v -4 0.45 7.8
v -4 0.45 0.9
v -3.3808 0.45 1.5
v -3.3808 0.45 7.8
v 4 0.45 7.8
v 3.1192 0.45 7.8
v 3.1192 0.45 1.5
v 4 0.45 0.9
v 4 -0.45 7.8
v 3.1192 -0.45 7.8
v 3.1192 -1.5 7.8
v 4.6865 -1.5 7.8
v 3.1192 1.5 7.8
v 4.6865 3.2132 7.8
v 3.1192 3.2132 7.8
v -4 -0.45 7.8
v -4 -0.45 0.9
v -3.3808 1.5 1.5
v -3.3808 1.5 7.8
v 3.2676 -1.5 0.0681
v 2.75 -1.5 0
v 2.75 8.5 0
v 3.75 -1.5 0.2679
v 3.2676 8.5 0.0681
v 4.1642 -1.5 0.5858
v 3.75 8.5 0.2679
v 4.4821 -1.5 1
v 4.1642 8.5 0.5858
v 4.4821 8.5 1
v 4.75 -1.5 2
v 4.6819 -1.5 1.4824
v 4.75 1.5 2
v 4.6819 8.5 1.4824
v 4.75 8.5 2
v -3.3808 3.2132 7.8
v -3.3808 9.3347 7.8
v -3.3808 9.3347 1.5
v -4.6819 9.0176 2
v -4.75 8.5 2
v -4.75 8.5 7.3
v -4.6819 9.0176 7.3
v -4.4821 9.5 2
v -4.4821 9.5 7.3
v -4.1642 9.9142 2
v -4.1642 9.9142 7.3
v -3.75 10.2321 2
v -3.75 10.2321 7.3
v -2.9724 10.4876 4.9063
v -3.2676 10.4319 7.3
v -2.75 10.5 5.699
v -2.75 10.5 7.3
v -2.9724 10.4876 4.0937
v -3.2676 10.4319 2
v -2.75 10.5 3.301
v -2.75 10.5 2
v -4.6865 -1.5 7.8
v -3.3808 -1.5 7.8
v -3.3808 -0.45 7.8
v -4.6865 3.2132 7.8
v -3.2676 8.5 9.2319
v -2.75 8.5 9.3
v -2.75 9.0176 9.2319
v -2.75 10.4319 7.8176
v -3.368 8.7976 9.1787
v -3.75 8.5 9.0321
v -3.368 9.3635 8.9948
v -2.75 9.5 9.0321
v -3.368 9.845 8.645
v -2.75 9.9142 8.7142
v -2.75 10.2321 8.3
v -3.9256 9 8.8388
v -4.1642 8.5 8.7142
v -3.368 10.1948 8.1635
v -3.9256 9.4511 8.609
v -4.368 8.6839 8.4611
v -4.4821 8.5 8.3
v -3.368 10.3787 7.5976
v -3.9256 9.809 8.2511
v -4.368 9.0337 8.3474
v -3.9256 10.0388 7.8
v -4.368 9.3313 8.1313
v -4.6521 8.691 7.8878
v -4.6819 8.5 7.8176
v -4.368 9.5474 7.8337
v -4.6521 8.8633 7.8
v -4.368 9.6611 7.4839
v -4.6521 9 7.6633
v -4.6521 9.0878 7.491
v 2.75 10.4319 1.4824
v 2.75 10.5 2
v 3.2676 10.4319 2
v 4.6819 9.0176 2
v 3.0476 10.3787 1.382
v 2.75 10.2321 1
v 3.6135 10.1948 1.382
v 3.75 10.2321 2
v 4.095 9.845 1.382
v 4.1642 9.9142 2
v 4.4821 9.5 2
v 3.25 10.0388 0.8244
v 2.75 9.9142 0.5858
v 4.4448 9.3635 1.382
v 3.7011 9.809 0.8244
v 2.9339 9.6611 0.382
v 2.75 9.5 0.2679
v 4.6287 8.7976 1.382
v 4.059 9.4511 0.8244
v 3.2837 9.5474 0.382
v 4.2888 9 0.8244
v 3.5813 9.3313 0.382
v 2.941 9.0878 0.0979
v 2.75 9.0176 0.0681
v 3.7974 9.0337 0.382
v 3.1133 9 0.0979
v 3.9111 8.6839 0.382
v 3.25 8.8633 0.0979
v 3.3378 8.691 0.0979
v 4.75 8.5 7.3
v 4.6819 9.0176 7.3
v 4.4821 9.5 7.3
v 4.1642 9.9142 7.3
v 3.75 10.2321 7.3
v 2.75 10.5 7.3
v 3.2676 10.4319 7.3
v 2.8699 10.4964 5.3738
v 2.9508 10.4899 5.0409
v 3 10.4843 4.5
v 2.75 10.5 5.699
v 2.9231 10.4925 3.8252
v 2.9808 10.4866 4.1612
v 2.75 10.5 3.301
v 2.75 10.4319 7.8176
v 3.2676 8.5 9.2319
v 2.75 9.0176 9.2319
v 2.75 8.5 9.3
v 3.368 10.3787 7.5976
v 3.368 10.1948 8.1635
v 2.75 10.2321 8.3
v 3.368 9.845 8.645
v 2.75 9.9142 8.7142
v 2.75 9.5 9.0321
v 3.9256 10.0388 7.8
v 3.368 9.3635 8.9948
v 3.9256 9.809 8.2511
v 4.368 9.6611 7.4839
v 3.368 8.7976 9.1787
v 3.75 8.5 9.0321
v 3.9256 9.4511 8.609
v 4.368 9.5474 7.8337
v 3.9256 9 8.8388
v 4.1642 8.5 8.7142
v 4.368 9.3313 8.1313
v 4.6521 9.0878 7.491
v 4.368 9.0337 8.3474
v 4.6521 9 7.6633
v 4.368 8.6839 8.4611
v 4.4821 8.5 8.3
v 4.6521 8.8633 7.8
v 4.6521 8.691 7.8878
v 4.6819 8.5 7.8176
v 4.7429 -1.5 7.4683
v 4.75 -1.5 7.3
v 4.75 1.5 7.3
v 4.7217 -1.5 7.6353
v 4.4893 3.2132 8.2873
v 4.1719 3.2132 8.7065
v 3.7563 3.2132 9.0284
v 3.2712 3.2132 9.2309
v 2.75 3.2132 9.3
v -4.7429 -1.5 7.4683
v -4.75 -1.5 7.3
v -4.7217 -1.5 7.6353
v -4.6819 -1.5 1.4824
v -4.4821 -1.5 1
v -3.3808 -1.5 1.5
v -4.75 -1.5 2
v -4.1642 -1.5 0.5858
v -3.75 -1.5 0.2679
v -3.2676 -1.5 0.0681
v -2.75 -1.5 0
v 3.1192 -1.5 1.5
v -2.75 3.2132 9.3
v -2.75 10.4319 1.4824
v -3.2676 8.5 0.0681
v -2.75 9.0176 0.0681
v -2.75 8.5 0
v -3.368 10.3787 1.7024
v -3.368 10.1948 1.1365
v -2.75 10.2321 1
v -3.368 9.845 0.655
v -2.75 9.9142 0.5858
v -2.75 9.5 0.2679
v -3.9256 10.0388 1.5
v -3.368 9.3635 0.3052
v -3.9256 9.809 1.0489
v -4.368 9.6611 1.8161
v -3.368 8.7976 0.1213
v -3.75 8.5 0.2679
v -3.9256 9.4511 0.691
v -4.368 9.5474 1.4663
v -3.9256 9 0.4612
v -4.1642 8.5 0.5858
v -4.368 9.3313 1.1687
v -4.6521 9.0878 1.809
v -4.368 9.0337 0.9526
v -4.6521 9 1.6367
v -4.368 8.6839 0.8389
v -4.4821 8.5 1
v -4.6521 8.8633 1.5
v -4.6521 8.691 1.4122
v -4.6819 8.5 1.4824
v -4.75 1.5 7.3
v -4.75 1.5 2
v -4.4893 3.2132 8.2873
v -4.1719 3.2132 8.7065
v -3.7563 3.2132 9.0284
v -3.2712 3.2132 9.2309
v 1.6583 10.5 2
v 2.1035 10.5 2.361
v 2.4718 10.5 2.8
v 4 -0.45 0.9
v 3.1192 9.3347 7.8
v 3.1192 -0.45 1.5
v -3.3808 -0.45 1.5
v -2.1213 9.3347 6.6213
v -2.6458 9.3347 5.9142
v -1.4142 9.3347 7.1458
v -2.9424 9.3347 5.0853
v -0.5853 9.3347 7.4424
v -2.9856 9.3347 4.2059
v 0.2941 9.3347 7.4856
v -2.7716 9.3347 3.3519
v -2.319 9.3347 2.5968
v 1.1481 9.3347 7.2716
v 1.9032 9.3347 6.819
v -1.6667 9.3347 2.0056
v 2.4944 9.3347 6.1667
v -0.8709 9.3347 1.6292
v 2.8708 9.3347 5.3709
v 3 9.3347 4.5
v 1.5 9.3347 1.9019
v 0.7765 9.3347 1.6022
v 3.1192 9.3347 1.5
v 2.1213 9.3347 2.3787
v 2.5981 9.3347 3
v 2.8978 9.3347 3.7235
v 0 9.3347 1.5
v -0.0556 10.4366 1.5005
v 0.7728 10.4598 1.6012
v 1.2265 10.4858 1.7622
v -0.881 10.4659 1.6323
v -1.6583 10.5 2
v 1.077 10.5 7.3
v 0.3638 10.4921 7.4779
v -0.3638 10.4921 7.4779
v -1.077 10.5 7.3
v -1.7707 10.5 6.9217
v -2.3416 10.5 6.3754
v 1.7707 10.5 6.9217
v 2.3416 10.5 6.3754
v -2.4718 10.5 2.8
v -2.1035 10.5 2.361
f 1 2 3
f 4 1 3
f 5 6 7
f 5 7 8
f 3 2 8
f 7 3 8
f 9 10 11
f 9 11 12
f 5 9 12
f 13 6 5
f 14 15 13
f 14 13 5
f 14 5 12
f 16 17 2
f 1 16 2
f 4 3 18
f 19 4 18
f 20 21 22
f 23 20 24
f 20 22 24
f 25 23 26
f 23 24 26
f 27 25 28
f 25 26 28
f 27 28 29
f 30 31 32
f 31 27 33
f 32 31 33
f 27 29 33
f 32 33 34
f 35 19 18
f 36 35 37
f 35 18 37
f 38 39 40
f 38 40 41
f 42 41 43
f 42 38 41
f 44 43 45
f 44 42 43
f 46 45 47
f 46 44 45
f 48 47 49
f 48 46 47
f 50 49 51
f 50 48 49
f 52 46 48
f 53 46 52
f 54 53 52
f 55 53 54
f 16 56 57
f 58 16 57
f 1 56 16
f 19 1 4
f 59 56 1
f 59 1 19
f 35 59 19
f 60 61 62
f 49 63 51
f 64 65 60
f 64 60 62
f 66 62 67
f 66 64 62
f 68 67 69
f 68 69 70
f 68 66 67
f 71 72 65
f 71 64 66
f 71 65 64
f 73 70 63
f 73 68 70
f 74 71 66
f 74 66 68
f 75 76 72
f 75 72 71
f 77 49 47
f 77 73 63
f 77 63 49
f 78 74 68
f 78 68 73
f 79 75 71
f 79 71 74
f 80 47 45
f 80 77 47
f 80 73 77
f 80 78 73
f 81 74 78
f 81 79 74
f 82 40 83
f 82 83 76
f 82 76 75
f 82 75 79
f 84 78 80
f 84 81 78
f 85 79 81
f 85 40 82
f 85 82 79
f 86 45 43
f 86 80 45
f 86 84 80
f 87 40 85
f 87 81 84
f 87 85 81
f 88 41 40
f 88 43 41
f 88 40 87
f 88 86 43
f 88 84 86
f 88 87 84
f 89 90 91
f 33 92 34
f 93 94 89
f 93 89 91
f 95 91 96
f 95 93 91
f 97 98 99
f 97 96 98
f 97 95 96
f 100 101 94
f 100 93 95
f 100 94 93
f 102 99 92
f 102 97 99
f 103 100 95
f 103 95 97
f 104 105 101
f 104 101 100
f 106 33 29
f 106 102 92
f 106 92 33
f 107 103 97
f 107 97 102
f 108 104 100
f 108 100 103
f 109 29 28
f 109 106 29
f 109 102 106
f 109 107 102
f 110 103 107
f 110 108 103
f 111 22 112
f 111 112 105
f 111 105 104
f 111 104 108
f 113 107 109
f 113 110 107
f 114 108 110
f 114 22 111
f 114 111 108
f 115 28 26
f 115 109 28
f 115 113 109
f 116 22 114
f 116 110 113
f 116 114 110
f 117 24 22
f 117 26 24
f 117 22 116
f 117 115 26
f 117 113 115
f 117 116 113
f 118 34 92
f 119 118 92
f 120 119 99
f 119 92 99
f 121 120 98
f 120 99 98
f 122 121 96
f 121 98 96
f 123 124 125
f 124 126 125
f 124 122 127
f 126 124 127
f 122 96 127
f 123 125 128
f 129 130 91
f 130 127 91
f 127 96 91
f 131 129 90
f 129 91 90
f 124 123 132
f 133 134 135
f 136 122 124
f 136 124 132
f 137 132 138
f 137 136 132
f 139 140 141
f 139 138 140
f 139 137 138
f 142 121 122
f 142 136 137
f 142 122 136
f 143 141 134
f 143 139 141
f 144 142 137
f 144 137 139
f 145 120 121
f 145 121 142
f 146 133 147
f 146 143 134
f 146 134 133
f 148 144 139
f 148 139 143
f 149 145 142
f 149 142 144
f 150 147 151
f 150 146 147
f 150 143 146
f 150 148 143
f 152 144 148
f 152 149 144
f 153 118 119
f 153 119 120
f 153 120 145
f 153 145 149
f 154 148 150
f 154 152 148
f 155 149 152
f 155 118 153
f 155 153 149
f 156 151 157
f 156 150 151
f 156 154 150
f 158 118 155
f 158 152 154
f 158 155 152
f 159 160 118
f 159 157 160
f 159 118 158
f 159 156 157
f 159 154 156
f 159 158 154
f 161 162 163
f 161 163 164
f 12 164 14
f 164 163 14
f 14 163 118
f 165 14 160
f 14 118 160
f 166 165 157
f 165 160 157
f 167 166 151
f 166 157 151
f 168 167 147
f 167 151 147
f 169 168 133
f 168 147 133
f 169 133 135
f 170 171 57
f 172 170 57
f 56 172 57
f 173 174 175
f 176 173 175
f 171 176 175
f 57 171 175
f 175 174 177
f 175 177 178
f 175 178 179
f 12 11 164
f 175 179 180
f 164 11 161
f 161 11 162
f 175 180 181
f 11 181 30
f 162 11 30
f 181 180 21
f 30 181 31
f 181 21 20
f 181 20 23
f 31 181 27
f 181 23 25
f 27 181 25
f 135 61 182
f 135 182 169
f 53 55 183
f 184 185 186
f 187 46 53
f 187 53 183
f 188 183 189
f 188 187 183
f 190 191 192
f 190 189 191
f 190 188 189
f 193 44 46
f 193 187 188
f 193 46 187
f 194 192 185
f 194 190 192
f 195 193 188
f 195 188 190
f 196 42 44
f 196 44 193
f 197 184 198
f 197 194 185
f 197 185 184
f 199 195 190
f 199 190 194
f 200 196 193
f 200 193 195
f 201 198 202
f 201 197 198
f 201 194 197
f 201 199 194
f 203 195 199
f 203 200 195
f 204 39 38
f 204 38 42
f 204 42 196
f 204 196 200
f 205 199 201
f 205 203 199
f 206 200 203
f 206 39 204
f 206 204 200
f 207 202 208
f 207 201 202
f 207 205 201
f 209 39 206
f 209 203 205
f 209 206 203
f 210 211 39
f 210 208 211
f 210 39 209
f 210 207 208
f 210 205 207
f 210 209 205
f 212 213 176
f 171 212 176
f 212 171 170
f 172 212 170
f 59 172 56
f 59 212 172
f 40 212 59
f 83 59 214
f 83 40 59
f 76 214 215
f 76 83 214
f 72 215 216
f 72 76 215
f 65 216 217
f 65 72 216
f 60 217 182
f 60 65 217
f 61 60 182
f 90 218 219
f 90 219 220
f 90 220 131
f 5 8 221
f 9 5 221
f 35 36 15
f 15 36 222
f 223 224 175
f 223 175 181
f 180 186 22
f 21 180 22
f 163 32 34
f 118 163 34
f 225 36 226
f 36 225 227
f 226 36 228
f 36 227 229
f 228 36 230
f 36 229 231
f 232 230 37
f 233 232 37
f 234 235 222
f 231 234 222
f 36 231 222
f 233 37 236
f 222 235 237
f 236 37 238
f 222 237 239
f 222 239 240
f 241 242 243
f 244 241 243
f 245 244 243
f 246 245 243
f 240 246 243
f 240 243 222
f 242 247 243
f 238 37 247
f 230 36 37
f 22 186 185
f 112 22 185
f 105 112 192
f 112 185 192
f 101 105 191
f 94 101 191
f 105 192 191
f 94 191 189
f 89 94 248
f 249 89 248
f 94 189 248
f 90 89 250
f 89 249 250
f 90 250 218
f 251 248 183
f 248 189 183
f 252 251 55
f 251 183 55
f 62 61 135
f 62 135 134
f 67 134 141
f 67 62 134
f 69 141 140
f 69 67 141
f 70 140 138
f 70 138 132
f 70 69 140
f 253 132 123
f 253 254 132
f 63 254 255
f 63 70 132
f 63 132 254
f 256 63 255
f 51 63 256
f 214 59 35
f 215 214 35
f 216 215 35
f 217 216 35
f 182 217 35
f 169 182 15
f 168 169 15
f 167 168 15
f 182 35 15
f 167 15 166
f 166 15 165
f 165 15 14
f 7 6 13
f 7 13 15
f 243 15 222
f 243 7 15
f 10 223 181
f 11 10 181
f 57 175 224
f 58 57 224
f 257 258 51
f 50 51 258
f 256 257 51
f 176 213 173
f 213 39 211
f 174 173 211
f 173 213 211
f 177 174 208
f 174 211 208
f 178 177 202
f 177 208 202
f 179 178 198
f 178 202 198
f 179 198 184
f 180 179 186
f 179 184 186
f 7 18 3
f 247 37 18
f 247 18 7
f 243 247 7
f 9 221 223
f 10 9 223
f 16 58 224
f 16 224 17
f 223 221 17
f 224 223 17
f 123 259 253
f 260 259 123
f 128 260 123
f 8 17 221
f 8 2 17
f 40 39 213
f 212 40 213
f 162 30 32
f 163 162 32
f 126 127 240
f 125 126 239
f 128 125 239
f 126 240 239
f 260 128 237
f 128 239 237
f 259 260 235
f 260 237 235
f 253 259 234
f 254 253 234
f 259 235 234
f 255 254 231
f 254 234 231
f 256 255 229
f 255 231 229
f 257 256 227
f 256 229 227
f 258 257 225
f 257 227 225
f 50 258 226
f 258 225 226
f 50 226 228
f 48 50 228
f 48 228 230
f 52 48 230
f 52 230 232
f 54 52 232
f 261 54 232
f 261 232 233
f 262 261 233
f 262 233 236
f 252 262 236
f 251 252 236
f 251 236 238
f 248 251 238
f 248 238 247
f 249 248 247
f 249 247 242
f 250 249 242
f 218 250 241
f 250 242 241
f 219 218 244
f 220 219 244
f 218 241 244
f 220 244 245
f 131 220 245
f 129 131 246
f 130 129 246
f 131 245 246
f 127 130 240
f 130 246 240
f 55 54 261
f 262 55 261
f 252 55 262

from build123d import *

# Parameters (mm, degrees)
F0_W         = 1.3692331631
F0_H         = 7.834737435
F0_W_2       = 6.5
F0_H_2       = 0.9
F0_W_3       = 0.6192331631
F0_H_3       = 1.05
F0_H_4       = 1.165262565
F0_W_4       = 0.8807668369
F0_W_5       = 1.6307668369
F1_DEPTH     = 0.9
F2_DEPTH     = 1.5
F3_DEPTH     = 7.8
F5_W         = 9.5
F5_H         = 7.2867757659
F6_DEPTH     = 1.5
F7_R         = 3
F8_DEPTH     = 10.501
F9_T1_DEPTH  = 5.3
F9_T3_DEPTH  = 5.5
F9_T5_DEPTH  = 10.2867757659
F9_T7_DEPTH  = 15
F9_S11_W     = 2
F9_S11_H     = 2
F9_T12_DEPTH = 2
F9_S17_W     = 2
F9_S17_H     = 2
F9_T18_DEPTH = 2
F9_S23_W     = 2
F9_S23_H     = 2
F9_T24_DEPTH = 2
F9_S29_W     = 2
F9_S29_H     = 2
F9_T30_DEPTH = 2


# Not quite as in the source:
# - a fillet or chamfer that OpenCascade refuses, or shapes differently, is made with other operations: its cross-section is extruded or revolved along the edge and cut away or added
# - a feature names something its author has since deleted; it is built from what else it names


with BuildPart() as f1:
    # F0 (on Top) → F1 (new body)
    with BuildSketch(Plane.XY):
        Polygon((-4.75, 1.5), (-4.75, -1.5), (-3.3807668369, -1.5), (-3.3807668369, -0.45), (-4, -0.45), (-4, 0.45), (-3.3807668369, 0.45), (-3.3807668369, 1.5), align=None)
        Polygon((-3.3807668369, -0.45), (-3.3807668369, -1.5), (-3.1192331631, -1.5), (3.1192331631, -1.5), (3.1192331631, -0.45), align=None)
        with Locations((-4.0653834185, 5.4173687175)):
            Rectangle(F0_W, F0_H)
        with Locations((-0.1307668369, 0)):
            Rectangle(F0_W_2, F0_H_2)
        with Locations((-3.6903834185, 0)):
            Rectangle(F0_W_3, F0_H_2)
        with Locations((-0.1307668369, 5.4173687175)):
            Rectangle(F0_W_2, F0_H)
        with Locations((-0.1307668369, 0.975)):
            Rectangle(F0_W_2, F0_H_3)
        with Locations((-4.0653834185, 9.9173687175)):
            Rectangle(F0_W, F0_H_4)
        Polygon((3.1192331631, -0.45), (3.1192331631, -1.5), (3.3807668369, -1.5), (4.75, -1.5), (4.75, 1.5), (3.1192331631, 1.5), (3.1192331631, 0.45), (4, 0.45), (4, -0.45), align=None)
        with Locations((3.5596165815, 0)):
            Rectangle(F0_W_4, F0_H_2)
        with Locations((3.9346165815, 5.4173687175)):
            Rectangle(F0_W_5, F0_H)
        with Locations((-0.1307668369, 9.9173687175)):
            Rectangle(F0_W_2, F0_H_4)
        with Locations((3.9346165815, 9.9173687175)):
            Rectangle(F0_W_5, F0_H_4)
    extrude(amount=F1_DEPTH)

    # F0 (on Top) → F2 (join)
    with BuildSketch(Plane.XY):
        Polygon((-3.3807668369, -0.45), (-3.3807668369, -1.5), (-3.1192331631, -1.5), (3.1192331631, -1.5), (3.1192331631, -0.45), align=None)
        Polygon((3.1192331631, -0.45), (3.1192331631, -1.5), (3.3807668369, -1.5), (4.75, -1.5), (4.75, 1.5), (3.1192331631, 1.5), (3.1192331631, 0.45), (4, 0.45), (4, -0.45), align=None)
        Polygon((-4.75, 1.5), (-4.75, -1.5), (-3.3807668369, -1.5), (-3.3807668369, -0.45), (-4, -0.45), (-4, 0.45), (-3.3807668369, 0.45), (-3.3807668369, 1.5), align=None)
        with Locations((-0.1307668369, 0.975)):
            Rectangle(F0_W_2, F0_H_3)
        with Locations((-4.0653834185, 5.4173687175)):
            Rectangle(F0_W, F0_H)
        with Locations((3.9346165815, 5.4173687175)):
            Rectangle(F0_W_5, F0_H)
        with Locations((-0.1307668369, 5.4173687175)):
            Rectangle(F0_W_2, F0_H)
        with Locations((-4.0653834185, 9.9173687175)):
            Rectangle(F0_W, F0_H_4)
        with Locations((-0.1307668369, 9.9173687175)):
            Rectangle(F0_W_2, F0_H_4)
        with Locations((3.9346165815, 9.9173687175)):
            Rectangle(F0_W_5, F0_H_4)
    extrude(amount=F2_DEPTH)

    # F0 (on Top) → F3 (join)
    with BuildSketch(Plane.XY):
        Polygon((-4.75, 1.5), (-4.75, -1.5), (-3.3807668369, -1.5), (-3.3807668369, -0.45), (-4, -0.45), (-4, 0.45), (-3.3807668369, 0.45), (-3.3807668369, 1.5), align=None)
        Polygon((3.1192331631, -0.45), (3.1192331631, -1.5), (3.3807668369, -1.5), (4.75, -1.5), (4.75, 1.5), (3.1192331631, 1.5), (3.1192331631, 0.45), (4, 0.45), (4, -0.45), align=None)
        with Locations((-4.0653834185, 5.4173687175)):
            Rectangle(F0_W, F0_H)
        with Locations((3.9346165815, 5.4173687175)):
            Rectangle(F0_W_5, F0_H)
        with Locations((-4.0653834185, 9.9173687175)):
            Rectangle(F0_W, F0_H_4)
        with Locations((-0.1307668369, 9.9173687175)):
            Rectangle(F0_W_2, F0_H_4)
        with Locations((3.9346165815, 9.9173687175)):
            Rectangle(F0_W_5, F0_H_4)
    extrude(amount=F3_DEPTH)

    # F5 (on offset) → F6 (join)
    with BuildSketch(Plane.XY.offset(7.8)):
        with Locations((0, 6.856612117)):
            Rectangle(F5_W, F5_H)
    extrude(amount=F6_DEPTH)

    # F7 (on Front) → F8 (cut, through all)
    with BuildSketch(Plane.XZ):
        with Locations((0, 4.5)):
            Circle(F7_R)
    extrude(amount=-F8_DEPTH, mode=Mode.SUBTRACT)

    # F9: fillet of radius 2 on 8 edges, made by hand

    # F9_s2 → F9_t1 (cut)
    with BuildSketch(Plane.XY.offset(2)):
        with BuildLine():
            ThreePointArc((4.75, 8.5), (4.1642135624, 9.9142135624), (2.75, 10.5))
            Line((2.75, 10.5), (4.75, 10.5))
            Line((4.75, 10.5), (4.75, 8.5))
        make_face()
        with BuildLine():
            ThreePointArc((-4.75, 8.5), (-4.1642135624, 9.9142135624), (-2.75, 10.5))
            Line((-2.75, 10.5), (-4.75, 10.5))
            Line((-4.75, 10.5), (-4.75, 8.5))
        make_face()
    extrude(amount=F9_T1_DEPTH, mode=Mode.SUBTRACT)

    # F9_s4 → F9_t3 (cut)
    with BuildSketch(Plane.YZ.offset(-2.75)):
        with BuildLine():
            ThreePointArc((8.5, 9.3), (9.9142135624, 8.7142135624), (10.5, 7.3))
            Line((10.5, 7.3), (10.5, 9.3))
            Line((10.5, 9.3), (8.5, 9.3))
        make_face()
        with BuildLine():
            ThreePointArc((8.5, 0), (9.9142135624, 0.5857864376), (10.5, 2))
            Line((10.5, 2), (10.5, 0))
            Line((10.5, 0), (8.5, 0))
        make_face()
    extrude(amount=F9_T3_DEPTH, mode=Mode.SUBTRACT)

    # F9_s6 → F9_t5 (cut)
    with BuildSketch(Plane.XZ.offset(-8.5)):
        with BuildLine():
            ThreePointArc((4.75, 7.3), (4.1642135624, 8.7142135624), (2.75, 9.3))
            Line((2.75, 9.3), (4.75, 9.3))
            Line((4.75, 9.3), (4.75, 7.3))
        make_face()
        with BuildLine():
            ThreePointArc((-4.75, 7.3), (-4.1642135624, 8.7142135624), (-2.75, 9.3))
            Line((-2.75, 9.3), (-4.75, 9.3))
            Line((-4.75, 9.3), (-4.75, 7.3))
        make_face()
    extrude(amount=F9_T5_DEPTH, mode=Mode.SUBTRACT)

    # F9_s8 → F9_t7 (cut)
    with BuildSketch(Plane.XZ.offset(-8.5)):
        with BuildLine():
            ThreePointArc((2.75, 0), (4.1642135624, 0.5857864376), (4.75, 2))
            Line((4.75, 2), (4.75, 0))
            Line((4.75, 0), (2.75, 0))
        make_face()
        with BuildLine():
            ThreePointArc((-4.75, 2), (-4.1642135624, 0.5857864376), (-2.75, 0))
            Line((-2.75, 0), (-4.75, 0))
            Line((-4.75, 0), (-4.75, 2))
        make_face()
    extrude(amount=F9_T7_DEPTH, mode=Mode.SUBTRACT)


with BuildPart() as f9_tool10:
    # F9_s11 → F9_t12 (new body)
    with BuildSketch(Plane.YZ.offset(2.75)):
        with Locations((9.5, 8.3)):
            Rectangle(F9_S11_W, F9_S11_H)
    extrude(amount=F9_T12_DEPTH)

    # F9_s13 → F9_t14 (revolve, cut)
    with BuildSketch(Plane(origin=(2.75, 8.5, 7.3), x_dir=(0, -0.7071067812, -0.7071067812), z_dir=(0, -0.7071067812, 0.7071067812))):
        with BuildLine():
            ThreePointArc((0, -2), (2, 0), (0, 2))
            Line((0, 2), (0, -2))
        make_face()
    revolve(axis=Axis((2.75, 8.5, 7.3), (1, 0, 0)), mode=Mode.SUBTRACT)


with BuildPart() as f1_1:
    add(f1.part)

    # F9_t9: cut F9_tool10
    add(f9_tool10.part, mode=Mode.SUBTRACT)


with BuildPart() as f9_tool16:
    # F9_s17 → F9_t18 (new body)
    with BuildSketch(Plane.XY.offset(2)):
        with Locations((3.75, 9.5)):
            Rectangle(F9_S17_W, F9_S17_H)
    extrude(amount=-F9_T18_DEPTH)

    # F9_s19 → F9_t20 (revolve, cut)
    with BuildSketch(Plane(origin=(2.75, 8.5, 2), x_dir=(-0.7071067812, -0.7071067812, 0), z_dir=(0.7071067812, -0.7071067812, 0))):
        with BuildLine():
            ThreePointArc((0, -2), (2, 0), (0, 2))
            Line((0, 2), (0, -2))
        make_face()
    revolve(axis=Axis((2.75, 8.5, 2), (0, 0, -1)), mode=Mode.SUBTRACT)


with BuildPart() as f1_2:
    add(f1_1.part)

    # F9_t15: cut F9_tool16
    add(f9_tool16.part, mode=Mode.SUBTRACT)


with BuildPart() as f9_tool22:
    # F9_s23 → F9_t24 (new body)
    with BuildSketch(Plane.YZ.offset(-2.75)):
        with Locations((9.5, 8.3)):
            Rectangle(F9_S23_W, F9_S23_H)
    extrude(amount=-F9_T24_DEPTH)

    # F9_s25 → F9_t26 (revolve, cut)
    with BuildSketch(Plane(origin=(-2.75, 8.5, 7.3), x_dir=(0, -0.7071067812, -0.7071067812), z_dir=(0, 0.7071067812, -0.7071067812))):
        with BuildLine():
            ThreePointArc((0, -2), (2, 0), (0, 2))
            Line((0, 2), (0, -2))
        make_face()
    revolve(axis=Axis((-2.75, 8.5, 7.3), (-1, 0, 0)), mode=Mode.SUBTRACT)


with BuildPart() as f1_3:
    add(f1_2.part)

    # F9_t21: cut F9_tool22
    add(f9_tool22.part, mode=Mode.SUBTRACT)


with BuildPart() as f9_tool28:
    # F9_s29 → F9_t30 (new body)
    with BuildSketch(Plane.YZ.offset(-2.75)):
        with Locations((9.5, 1)):
            Rectangle(F9_S29_W, F9_S29_H)
    extrude(amount=-F9_T30_DEPTH)

    # F9_s31 → F9_t32 (revolve, cut)
    with BuildSketch(Plane(origin=(-2.75, 8.5, 2), x_dir=(0, -0.7071067812, 0.7071067812), z_dir=(0, -0.7071067812, -0.7071067812))):
        with BuildLine():
            ThreePointArc((0, -2), (2, 0), (0, 2))
            Line((0, 2), (0, -2))
        make_face()
    revolve(axis=Axis((-2.75, 8.5, 2), (-1, 0, 0)), mode=Mode.SUBTRACT)


with BuildPart() as f1_4:
    add(f1_3.part)

    # F9_t27: cut F9_tool28
    add(f9_tool28.part, mode=Mode.SUBTRACT)


solid = f1_4.part
